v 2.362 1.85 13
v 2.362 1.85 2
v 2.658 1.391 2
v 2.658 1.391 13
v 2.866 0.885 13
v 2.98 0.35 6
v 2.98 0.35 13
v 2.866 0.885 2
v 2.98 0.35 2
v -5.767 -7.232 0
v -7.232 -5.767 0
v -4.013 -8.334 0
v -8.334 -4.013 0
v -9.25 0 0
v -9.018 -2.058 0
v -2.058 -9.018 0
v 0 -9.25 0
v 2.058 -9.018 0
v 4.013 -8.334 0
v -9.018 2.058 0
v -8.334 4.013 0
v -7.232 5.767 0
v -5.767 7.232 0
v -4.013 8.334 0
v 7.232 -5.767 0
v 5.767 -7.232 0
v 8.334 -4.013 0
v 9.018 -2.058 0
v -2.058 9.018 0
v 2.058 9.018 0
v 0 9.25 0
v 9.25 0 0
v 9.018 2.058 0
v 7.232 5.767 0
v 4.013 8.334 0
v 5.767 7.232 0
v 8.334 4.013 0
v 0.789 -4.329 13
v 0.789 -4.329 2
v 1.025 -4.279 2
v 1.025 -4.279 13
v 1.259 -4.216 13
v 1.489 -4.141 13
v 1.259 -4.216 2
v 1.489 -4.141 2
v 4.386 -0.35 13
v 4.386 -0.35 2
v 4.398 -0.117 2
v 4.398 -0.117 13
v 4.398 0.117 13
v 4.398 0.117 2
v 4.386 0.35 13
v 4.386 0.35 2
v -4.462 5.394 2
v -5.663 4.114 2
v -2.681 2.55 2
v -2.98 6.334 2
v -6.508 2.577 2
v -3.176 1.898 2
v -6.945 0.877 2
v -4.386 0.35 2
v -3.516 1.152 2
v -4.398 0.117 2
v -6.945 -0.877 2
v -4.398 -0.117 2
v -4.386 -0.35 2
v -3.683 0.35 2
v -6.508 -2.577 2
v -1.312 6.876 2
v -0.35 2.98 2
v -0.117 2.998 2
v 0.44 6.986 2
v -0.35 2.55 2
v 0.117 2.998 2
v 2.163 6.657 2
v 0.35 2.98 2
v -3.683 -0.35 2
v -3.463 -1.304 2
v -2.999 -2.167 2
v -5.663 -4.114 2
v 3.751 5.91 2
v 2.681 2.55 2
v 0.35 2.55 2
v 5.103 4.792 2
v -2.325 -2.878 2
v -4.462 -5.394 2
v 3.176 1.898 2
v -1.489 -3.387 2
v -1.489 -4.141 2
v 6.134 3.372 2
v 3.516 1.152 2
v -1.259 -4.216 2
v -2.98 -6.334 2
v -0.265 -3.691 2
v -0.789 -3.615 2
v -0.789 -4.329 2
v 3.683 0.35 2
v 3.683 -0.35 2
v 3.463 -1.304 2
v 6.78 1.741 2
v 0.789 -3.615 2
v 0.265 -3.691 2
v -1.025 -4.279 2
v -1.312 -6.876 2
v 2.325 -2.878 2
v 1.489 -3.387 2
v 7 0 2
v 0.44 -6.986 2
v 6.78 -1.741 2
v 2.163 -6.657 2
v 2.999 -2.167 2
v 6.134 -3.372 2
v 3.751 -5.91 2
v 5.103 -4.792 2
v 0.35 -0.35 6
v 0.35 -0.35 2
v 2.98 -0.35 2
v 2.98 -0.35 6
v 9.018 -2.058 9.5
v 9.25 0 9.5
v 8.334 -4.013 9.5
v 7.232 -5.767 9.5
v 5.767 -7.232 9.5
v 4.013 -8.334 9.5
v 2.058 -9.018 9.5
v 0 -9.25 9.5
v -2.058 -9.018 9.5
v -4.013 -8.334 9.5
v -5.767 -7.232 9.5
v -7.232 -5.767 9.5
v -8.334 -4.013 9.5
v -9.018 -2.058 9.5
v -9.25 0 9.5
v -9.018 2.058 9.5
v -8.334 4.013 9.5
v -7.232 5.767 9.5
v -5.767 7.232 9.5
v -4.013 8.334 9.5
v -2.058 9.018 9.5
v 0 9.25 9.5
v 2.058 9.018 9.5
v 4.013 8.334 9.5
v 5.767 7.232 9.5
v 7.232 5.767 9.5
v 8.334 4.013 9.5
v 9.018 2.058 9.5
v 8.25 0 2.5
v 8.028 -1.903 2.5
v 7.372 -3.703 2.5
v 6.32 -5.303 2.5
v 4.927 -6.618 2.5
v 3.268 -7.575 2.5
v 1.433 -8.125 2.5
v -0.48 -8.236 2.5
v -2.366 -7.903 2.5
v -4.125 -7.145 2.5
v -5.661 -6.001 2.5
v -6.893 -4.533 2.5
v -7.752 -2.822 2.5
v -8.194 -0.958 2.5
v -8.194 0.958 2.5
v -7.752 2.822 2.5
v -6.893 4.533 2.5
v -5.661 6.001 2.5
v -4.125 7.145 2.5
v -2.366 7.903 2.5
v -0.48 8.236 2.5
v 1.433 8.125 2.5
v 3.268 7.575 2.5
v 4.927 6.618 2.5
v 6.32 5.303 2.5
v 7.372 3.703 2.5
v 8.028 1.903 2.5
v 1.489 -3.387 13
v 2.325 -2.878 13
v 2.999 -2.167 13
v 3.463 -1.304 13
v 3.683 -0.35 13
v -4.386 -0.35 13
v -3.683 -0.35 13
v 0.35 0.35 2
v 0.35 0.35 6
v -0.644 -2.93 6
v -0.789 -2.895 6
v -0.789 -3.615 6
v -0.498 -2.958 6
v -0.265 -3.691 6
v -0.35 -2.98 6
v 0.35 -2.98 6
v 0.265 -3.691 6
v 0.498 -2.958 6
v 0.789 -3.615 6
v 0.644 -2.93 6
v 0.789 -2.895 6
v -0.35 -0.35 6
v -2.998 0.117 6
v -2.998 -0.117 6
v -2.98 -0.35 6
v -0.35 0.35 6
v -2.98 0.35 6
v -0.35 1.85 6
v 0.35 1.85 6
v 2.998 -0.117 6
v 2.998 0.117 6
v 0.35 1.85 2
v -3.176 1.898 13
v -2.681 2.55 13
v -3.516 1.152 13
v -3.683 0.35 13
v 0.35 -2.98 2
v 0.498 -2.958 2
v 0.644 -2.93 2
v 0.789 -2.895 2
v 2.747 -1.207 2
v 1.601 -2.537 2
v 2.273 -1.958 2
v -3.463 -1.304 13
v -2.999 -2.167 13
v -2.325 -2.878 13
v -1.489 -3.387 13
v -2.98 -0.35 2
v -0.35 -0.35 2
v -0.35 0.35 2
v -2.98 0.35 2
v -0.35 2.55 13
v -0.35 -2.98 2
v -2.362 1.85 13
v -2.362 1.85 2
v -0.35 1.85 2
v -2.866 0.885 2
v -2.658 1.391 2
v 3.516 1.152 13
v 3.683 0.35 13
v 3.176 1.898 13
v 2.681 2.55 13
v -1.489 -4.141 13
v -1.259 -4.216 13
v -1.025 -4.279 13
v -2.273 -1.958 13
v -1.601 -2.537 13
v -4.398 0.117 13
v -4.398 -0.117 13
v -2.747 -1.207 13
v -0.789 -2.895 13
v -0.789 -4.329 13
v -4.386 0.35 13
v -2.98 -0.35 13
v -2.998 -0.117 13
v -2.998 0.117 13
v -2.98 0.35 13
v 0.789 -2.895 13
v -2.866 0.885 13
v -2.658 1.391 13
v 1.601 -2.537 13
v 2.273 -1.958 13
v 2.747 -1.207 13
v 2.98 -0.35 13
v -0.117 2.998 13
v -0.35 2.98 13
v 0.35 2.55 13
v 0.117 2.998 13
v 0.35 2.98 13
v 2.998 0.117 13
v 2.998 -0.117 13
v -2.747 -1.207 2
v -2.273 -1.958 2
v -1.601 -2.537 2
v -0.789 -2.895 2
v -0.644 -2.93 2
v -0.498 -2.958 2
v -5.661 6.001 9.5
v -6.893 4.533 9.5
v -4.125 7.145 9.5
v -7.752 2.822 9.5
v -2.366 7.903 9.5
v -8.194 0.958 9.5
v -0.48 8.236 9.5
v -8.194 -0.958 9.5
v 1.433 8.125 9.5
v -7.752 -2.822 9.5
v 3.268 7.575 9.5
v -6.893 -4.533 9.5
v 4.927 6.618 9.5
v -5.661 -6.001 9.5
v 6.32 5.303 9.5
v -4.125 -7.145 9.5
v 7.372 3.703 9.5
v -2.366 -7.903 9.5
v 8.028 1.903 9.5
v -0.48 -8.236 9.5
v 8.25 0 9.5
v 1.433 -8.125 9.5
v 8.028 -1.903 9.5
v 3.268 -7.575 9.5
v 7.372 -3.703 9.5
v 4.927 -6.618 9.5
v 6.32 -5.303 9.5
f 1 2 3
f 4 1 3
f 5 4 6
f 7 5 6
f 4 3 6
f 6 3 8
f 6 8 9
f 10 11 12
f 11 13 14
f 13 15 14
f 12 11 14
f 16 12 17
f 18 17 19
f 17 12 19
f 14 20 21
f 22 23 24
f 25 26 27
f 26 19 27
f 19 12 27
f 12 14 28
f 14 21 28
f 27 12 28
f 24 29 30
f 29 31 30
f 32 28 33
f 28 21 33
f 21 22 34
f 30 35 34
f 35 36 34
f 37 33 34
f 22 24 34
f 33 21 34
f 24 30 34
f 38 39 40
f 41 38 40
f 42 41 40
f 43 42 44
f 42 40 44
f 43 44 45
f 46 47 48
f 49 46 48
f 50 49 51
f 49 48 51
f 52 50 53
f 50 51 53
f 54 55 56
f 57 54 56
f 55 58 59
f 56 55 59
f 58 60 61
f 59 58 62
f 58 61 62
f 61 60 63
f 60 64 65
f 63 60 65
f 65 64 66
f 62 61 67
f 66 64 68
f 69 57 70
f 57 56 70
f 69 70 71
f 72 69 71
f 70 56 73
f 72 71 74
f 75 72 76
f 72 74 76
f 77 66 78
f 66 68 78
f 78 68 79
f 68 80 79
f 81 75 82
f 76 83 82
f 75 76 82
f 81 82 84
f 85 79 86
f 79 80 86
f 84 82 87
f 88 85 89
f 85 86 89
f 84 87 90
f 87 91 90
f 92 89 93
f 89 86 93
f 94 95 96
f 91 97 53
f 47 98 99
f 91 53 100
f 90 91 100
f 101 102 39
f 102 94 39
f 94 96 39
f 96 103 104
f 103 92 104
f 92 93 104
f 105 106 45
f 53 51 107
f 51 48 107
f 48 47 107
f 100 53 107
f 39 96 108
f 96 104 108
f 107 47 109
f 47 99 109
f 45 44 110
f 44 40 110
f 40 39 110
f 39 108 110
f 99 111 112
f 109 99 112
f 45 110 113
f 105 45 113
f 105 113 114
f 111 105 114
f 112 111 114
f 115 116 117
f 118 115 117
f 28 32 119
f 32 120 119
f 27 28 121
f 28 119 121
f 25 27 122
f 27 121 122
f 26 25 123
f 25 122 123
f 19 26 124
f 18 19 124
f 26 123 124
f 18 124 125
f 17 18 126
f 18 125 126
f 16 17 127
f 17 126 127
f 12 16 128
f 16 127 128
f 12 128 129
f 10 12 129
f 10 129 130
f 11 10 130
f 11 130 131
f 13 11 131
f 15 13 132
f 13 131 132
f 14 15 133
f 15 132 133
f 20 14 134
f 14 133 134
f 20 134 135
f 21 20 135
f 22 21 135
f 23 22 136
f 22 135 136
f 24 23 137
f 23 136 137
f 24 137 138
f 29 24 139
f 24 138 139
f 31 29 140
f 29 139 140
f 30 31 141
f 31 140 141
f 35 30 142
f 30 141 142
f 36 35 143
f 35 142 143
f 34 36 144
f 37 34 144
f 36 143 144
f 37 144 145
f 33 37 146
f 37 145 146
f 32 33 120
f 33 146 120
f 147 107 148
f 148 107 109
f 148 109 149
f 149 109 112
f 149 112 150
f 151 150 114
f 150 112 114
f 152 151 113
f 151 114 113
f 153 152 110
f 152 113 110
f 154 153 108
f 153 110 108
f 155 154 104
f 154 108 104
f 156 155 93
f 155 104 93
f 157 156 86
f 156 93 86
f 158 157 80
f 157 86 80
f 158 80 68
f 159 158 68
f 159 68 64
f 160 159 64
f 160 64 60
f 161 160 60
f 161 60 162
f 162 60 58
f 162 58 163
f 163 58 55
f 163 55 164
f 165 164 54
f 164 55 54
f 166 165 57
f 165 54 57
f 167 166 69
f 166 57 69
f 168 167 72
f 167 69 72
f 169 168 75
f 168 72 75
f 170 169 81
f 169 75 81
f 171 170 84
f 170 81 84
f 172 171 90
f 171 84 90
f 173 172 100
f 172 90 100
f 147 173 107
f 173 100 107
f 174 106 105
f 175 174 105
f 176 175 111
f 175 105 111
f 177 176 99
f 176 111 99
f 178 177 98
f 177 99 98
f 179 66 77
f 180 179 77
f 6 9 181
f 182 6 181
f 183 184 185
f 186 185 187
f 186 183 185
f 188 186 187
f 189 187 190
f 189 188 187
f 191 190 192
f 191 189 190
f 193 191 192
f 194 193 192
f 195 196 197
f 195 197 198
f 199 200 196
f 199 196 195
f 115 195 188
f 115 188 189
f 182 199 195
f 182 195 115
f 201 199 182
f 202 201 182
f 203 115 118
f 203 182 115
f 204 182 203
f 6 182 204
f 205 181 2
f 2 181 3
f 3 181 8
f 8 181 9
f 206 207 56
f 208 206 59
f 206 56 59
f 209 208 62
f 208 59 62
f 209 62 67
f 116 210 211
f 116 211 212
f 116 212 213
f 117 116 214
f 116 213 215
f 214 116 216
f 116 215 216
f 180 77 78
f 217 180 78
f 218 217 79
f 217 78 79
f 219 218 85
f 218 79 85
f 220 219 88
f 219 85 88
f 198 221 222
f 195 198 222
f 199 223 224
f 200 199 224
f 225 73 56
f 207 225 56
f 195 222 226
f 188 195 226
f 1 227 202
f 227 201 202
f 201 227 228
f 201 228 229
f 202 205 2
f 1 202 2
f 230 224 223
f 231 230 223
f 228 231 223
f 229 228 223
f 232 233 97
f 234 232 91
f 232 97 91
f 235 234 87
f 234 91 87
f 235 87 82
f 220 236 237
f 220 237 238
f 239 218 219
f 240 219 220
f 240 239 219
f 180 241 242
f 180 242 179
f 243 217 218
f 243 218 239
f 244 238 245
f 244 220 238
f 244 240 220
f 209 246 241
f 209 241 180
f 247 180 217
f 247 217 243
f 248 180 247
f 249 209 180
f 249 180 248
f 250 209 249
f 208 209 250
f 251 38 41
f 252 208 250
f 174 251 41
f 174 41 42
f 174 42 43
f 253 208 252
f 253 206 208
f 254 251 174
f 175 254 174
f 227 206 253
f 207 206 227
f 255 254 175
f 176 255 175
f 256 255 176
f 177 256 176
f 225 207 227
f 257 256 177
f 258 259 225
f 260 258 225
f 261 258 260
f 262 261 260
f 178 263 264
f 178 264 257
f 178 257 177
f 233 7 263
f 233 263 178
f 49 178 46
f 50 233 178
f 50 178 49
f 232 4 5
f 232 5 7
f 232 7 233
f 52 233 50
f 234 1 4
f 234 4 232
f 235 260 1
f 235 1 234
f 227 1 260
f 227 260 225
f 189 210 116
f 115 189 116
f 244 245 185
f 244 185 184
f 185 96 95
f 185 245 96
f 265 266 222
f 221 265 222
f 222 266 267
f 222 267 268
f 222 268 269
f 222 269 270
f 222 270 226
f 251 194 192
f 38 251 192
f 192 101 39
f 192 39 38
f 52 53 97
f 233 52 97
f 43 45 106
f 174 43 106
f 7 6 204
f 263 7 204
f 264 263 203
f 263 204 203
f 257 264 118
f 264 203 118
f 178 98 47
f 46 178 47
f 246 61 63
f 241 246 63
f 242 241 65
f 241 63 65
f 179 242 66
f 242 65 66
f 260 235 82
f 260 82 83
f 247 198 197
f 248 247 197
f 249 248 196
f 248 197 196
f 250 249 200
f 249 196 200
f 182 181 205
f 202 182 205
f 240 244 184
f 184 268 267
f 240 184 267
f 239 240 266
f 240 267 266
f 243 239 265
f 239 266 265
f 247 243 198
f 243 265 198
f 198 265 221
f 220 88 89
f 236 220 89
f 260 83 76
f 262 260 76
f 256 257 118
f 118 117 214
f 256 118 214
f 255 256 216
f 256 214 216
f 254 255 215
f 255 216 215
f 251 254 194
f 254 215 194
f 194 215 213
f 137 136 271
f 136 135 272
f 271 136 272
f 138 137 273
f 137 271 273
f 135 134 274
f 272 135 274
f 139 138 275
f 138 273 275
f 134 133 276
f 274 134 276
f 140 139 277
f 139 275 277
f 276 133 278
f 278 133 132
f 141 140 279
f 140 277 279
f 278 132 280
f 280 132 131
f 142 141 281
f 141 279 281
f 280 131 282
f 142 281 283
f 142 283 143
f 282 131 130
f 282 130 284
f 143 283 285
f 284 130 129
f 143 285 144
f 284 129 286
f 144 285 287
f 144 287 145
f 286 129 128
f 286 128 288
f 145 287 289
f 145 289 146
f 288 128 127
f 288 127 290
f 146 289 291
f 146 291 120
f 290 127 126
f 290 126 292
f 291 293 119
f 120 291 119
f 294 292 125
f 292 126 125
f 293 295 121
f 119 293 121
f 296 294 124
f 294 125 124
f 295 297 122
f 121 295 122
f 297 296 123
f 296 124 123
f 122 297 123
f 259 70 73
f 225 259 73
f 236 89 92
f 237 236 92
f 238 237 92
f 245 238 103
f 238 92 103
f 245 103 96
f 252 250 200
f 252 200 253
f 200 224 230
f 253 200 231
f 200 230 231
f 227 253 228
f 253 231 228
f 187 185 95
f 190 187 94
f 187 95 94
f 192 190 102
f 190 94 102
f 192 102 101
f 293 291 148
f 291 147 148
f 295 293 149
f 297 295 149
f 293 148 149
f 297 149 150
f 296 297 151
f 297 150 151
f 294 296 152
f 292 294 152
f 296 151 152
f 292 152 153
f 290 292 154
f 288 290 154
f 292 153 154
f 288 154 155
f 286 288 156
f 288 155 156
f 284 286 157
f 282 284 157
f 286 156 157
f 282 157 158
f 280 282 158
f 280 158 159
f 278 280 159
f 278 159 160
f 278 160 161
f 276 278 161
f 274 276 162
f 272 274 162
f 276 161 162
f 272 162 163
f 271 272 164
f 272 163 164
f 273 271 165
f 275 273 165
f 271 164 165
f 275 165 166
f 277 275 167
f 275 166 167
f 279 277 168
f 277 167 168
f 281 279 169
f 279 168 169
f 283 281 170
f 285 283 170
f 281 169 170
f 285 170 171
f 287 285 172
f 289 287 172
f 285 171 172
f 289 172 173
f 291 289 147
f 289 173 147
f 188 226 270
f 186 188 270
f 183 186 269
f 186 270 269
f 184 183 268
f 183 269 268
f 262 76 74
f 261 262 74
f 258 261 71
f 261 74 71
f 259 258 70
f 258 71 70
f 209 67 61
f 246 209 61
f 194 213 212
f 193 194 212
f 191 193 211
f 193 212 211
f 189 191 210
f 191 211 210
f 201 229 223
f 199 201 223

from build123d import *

# Parameters (mm, degrees)
F2_W     = 0.7
F2_H     = 0.7
F3_DEPTH = 13
F4_DEPTH = 6


with BuildPart() as f1:
    # F0 (on Front) → F1 (revolve)
    with BuildSketch(Plane.XZ):
        Polygon((0, 2), (0, 0), (9.25, 0), (9.25, 9.5), (8.25, 9.5), (8.25, 2.5), (7, 2), align=None)
    revolve(axis=Axis((0, 0, -0.2857148442), (0, 0, -1)))

    # F2 (on Top) → F3 (join)
    with BuildSketch(Plane.XY):
        with BuildLine():
            Line((-2.9795133831, -0.35), (-3.6834087473, -0.35))
            ThreePointArc((-3.6834087473, -0.35), (-2.9989376836, -2.1671116191), (-1.4885221007, -3.3873739026))
            Line((-1.4885221007, -3.3873739026), (-1.4885221007, -4.1405678301))
            ThreePointArc((-1.4885221007, -4.1405678301), (-1.1424042215, -4.2491072703), (-0.7885221007, -4.3287680576))
            Line((-0.7885221007, -4.3287680576), (-0.7885221007, -3.6150010922))
            Line((-0.7885221007, -3.6150010922), (-0.7885221007, -2.8945177313))
            ThreePointArc((-0.7885221007, -2.8945177313), (-2.2733599524, -1.9575072227), (-2.9795133831, -0.35))
        make_face()
        with BuildLine():
            Line((-0.35, 1.85), (-0.35, 2.55))
            Line((-0.35, 2.55), (-2.6809513237, 2.55))
            ThreePointArc((-2.6809513237, 2.55), (-3.366937745, 1.5341871534), (-3.6834087473, 0.35))
            Line((-3.6834087473, 0.35), (-2.9795133831, 0.35))
            ThreePointArc((-2.9795133831, 0.35), (-2.7739084983, 1.1425548752), (-2.3616731357, 1.85))
            Line((-2.3616731357, 1.85), (-0.35, 1.85))
        make_face()
        with BuildLine():
            Line((2.6809513237, 2.55), (0.35, 2.55))
            Line((0.35, 2.55), (0.35, 1.85))
            Line((0.35, 1.85), (2.3616731357, 1.85))
            ThreePointArc((2.3616731357, 1.85), (2.7739084983, 1.1425548752), (2.9795133831, 0.35))
            Line((2.9795133831, 0.35), (3.6834087473, 0.35))
            ThreePointArc((3.6834087473, 0.35), (3.366937745, 1.5341871534), (2.6809513237, 2.55))
        make_face()
        with BuildLine():
            ThreePointArc((3.6834087473, -0.35), (3.7, 0), (3.6834087473, 0.35))
            Line((3.6834087473, 0.35), (2.9795133831, 0.35))
            ThreePointArc((2.9795133831, 0.35), (3, 0), (2.9795133831, -0.35))
            Line((2.9795133831, -0.35), (3.6834087473, -0.35))
        make_face()
        with Locations((0, 2.2)):
            Rectangle(F2_W, F2_H)
        with BuildLine():
            Line((-2.9795133831, 0.35), (-3.6834087473, 0.35))
            ThreePointArc((-3.6834087473, 0.35), (-3.7, 0), (-3.6834087473, -0.35))
            Line((-3.6834087473, -0.35), (-2.9795133831, -0.35))
            ThreePointArc((-2.9795133831, -0.35), (-3, 0), (-2.9795133831, 0.35))
        make_face()
        with BuildLine():
            ThreePointArc((1.4885221007, -3.3873739026), (2.9989376836, -2.1671116191), (3.6834087473, -0.35))
            Line((3.6834087473, -0.35), (2.9795133831, -0.35))
            ThreePointArc((2.9795133831, -0.35), (2.2733599524, -1.9575072227), (0.7885221007, -2.8945177313))
            Line((0.7885221007, -2.8945177313), (0.7885221007, -3.6150010922))
            Line((0.7885221007, -3.6150010922), (0.7885221007, -4.3287680576))
            ThreePointArc((0.7885221007, -4.3287680576), (1.1424042215, -4.2491072703), (1.4885221007, -4.1405678301))
            Line((1.4885221007, -4.1405678301), (1.4885221007, -3.3873739026))
        make_face()
        with BuildLine():
            ThreePointArc((-3.6834087473, -0.35), (-3.7, 0), (-3.6834087473, 0.35))
            Line((-3.6834087473, 0.35), (-4.3860574552, 0.35))
            ThreePointArc((-4.3860574552, 0.35), (-4.4, 0), (-4.3860574552, -0.35))
            Line((-4.3860574552, -0.35), (-3.6834087473, -0.35))
        make_face()
        with BuildLine():
            Line((0.35, 2.55), (0.35, 2.9795133831))
            ThreePointArc((0.35, 2.9795133831), (0, 3), (-0.35, 2.9795133831))
            Line((-0.35, 2.9795133831), (-0.35, 2.55))
            Line((-0.35, 2.55), (0.35, 2.55))
        make_face()
        with BuildLine():
            Line((4.3860574552, 0.35), (3.6834087473, 0.35))
            ThreePointArc((3.6834087473, 0.35), (3.7, 0), (3.6834087473, -0.35))
            Line((3.6834087473, -0.35), (4.3860574552, -0.35))
            ThreePointArc((4.3860574552, -0.35), (4.4, 0), (4.3860574552, 0.35))
        make_face()
    extrude(amount=F3_DEPTH)

    # F2 (on Top) → F4 (join)
    with BuildSketch(Plane.XY):
        with BuildLine():
            Line((0.35, 0.35), (0.35, 1.85))
            Line((0.35, 1.85), (-0.35, 1.85))
            Line((-0.35, 1.85), (-0.35, 0.35))
            Line((-0.35, 0.35), (-2.9795133831, 0.35))
            ThreePointArc((-2.9795133831, 0.35), (-3, 0), (-2.9795133831, -0.35))
            Line((-2.9795133831, -0.35), (-0.35, -0.35))
            Line((-0.35, -0.35), (-0.35, -2.9795133831))
            ThreePointArc((-0.35, -2.9795133831), (-0.5708451705, -2.9451885833), (-0.7885221007, -2.8945177313))
            Line((-0.7885221007, -2.8945177313), (-0.7885221007, -3.6150010922))
            ThreePointArc((-0.7885221007, -3.6150010922), (0, -3.7), (0.7885221007, -3.6150010922))
            Line((0.7885221007, -3.6150010922), (0.7885221007, -2.8945177313))
            ThreePointArc((0.7885221007, -2.8945177313), (0.5708451705, -2.9451885833), (0.35, -2.9795133831))
            Line((0.35, -2.9795133831), (0.35, -0.35))
            Line((0.35, -0.35), (2.9795133831, -0.35))
            ThreePointArc((2.9795133831, -0.35), (3, 0), (2.9795133831, 0.35))
            Line((2.9795133831, 0.35), (0.35, 0.35))
        make_face()
    extrude(amount=F4_DEPTH)


solid = f1.part
